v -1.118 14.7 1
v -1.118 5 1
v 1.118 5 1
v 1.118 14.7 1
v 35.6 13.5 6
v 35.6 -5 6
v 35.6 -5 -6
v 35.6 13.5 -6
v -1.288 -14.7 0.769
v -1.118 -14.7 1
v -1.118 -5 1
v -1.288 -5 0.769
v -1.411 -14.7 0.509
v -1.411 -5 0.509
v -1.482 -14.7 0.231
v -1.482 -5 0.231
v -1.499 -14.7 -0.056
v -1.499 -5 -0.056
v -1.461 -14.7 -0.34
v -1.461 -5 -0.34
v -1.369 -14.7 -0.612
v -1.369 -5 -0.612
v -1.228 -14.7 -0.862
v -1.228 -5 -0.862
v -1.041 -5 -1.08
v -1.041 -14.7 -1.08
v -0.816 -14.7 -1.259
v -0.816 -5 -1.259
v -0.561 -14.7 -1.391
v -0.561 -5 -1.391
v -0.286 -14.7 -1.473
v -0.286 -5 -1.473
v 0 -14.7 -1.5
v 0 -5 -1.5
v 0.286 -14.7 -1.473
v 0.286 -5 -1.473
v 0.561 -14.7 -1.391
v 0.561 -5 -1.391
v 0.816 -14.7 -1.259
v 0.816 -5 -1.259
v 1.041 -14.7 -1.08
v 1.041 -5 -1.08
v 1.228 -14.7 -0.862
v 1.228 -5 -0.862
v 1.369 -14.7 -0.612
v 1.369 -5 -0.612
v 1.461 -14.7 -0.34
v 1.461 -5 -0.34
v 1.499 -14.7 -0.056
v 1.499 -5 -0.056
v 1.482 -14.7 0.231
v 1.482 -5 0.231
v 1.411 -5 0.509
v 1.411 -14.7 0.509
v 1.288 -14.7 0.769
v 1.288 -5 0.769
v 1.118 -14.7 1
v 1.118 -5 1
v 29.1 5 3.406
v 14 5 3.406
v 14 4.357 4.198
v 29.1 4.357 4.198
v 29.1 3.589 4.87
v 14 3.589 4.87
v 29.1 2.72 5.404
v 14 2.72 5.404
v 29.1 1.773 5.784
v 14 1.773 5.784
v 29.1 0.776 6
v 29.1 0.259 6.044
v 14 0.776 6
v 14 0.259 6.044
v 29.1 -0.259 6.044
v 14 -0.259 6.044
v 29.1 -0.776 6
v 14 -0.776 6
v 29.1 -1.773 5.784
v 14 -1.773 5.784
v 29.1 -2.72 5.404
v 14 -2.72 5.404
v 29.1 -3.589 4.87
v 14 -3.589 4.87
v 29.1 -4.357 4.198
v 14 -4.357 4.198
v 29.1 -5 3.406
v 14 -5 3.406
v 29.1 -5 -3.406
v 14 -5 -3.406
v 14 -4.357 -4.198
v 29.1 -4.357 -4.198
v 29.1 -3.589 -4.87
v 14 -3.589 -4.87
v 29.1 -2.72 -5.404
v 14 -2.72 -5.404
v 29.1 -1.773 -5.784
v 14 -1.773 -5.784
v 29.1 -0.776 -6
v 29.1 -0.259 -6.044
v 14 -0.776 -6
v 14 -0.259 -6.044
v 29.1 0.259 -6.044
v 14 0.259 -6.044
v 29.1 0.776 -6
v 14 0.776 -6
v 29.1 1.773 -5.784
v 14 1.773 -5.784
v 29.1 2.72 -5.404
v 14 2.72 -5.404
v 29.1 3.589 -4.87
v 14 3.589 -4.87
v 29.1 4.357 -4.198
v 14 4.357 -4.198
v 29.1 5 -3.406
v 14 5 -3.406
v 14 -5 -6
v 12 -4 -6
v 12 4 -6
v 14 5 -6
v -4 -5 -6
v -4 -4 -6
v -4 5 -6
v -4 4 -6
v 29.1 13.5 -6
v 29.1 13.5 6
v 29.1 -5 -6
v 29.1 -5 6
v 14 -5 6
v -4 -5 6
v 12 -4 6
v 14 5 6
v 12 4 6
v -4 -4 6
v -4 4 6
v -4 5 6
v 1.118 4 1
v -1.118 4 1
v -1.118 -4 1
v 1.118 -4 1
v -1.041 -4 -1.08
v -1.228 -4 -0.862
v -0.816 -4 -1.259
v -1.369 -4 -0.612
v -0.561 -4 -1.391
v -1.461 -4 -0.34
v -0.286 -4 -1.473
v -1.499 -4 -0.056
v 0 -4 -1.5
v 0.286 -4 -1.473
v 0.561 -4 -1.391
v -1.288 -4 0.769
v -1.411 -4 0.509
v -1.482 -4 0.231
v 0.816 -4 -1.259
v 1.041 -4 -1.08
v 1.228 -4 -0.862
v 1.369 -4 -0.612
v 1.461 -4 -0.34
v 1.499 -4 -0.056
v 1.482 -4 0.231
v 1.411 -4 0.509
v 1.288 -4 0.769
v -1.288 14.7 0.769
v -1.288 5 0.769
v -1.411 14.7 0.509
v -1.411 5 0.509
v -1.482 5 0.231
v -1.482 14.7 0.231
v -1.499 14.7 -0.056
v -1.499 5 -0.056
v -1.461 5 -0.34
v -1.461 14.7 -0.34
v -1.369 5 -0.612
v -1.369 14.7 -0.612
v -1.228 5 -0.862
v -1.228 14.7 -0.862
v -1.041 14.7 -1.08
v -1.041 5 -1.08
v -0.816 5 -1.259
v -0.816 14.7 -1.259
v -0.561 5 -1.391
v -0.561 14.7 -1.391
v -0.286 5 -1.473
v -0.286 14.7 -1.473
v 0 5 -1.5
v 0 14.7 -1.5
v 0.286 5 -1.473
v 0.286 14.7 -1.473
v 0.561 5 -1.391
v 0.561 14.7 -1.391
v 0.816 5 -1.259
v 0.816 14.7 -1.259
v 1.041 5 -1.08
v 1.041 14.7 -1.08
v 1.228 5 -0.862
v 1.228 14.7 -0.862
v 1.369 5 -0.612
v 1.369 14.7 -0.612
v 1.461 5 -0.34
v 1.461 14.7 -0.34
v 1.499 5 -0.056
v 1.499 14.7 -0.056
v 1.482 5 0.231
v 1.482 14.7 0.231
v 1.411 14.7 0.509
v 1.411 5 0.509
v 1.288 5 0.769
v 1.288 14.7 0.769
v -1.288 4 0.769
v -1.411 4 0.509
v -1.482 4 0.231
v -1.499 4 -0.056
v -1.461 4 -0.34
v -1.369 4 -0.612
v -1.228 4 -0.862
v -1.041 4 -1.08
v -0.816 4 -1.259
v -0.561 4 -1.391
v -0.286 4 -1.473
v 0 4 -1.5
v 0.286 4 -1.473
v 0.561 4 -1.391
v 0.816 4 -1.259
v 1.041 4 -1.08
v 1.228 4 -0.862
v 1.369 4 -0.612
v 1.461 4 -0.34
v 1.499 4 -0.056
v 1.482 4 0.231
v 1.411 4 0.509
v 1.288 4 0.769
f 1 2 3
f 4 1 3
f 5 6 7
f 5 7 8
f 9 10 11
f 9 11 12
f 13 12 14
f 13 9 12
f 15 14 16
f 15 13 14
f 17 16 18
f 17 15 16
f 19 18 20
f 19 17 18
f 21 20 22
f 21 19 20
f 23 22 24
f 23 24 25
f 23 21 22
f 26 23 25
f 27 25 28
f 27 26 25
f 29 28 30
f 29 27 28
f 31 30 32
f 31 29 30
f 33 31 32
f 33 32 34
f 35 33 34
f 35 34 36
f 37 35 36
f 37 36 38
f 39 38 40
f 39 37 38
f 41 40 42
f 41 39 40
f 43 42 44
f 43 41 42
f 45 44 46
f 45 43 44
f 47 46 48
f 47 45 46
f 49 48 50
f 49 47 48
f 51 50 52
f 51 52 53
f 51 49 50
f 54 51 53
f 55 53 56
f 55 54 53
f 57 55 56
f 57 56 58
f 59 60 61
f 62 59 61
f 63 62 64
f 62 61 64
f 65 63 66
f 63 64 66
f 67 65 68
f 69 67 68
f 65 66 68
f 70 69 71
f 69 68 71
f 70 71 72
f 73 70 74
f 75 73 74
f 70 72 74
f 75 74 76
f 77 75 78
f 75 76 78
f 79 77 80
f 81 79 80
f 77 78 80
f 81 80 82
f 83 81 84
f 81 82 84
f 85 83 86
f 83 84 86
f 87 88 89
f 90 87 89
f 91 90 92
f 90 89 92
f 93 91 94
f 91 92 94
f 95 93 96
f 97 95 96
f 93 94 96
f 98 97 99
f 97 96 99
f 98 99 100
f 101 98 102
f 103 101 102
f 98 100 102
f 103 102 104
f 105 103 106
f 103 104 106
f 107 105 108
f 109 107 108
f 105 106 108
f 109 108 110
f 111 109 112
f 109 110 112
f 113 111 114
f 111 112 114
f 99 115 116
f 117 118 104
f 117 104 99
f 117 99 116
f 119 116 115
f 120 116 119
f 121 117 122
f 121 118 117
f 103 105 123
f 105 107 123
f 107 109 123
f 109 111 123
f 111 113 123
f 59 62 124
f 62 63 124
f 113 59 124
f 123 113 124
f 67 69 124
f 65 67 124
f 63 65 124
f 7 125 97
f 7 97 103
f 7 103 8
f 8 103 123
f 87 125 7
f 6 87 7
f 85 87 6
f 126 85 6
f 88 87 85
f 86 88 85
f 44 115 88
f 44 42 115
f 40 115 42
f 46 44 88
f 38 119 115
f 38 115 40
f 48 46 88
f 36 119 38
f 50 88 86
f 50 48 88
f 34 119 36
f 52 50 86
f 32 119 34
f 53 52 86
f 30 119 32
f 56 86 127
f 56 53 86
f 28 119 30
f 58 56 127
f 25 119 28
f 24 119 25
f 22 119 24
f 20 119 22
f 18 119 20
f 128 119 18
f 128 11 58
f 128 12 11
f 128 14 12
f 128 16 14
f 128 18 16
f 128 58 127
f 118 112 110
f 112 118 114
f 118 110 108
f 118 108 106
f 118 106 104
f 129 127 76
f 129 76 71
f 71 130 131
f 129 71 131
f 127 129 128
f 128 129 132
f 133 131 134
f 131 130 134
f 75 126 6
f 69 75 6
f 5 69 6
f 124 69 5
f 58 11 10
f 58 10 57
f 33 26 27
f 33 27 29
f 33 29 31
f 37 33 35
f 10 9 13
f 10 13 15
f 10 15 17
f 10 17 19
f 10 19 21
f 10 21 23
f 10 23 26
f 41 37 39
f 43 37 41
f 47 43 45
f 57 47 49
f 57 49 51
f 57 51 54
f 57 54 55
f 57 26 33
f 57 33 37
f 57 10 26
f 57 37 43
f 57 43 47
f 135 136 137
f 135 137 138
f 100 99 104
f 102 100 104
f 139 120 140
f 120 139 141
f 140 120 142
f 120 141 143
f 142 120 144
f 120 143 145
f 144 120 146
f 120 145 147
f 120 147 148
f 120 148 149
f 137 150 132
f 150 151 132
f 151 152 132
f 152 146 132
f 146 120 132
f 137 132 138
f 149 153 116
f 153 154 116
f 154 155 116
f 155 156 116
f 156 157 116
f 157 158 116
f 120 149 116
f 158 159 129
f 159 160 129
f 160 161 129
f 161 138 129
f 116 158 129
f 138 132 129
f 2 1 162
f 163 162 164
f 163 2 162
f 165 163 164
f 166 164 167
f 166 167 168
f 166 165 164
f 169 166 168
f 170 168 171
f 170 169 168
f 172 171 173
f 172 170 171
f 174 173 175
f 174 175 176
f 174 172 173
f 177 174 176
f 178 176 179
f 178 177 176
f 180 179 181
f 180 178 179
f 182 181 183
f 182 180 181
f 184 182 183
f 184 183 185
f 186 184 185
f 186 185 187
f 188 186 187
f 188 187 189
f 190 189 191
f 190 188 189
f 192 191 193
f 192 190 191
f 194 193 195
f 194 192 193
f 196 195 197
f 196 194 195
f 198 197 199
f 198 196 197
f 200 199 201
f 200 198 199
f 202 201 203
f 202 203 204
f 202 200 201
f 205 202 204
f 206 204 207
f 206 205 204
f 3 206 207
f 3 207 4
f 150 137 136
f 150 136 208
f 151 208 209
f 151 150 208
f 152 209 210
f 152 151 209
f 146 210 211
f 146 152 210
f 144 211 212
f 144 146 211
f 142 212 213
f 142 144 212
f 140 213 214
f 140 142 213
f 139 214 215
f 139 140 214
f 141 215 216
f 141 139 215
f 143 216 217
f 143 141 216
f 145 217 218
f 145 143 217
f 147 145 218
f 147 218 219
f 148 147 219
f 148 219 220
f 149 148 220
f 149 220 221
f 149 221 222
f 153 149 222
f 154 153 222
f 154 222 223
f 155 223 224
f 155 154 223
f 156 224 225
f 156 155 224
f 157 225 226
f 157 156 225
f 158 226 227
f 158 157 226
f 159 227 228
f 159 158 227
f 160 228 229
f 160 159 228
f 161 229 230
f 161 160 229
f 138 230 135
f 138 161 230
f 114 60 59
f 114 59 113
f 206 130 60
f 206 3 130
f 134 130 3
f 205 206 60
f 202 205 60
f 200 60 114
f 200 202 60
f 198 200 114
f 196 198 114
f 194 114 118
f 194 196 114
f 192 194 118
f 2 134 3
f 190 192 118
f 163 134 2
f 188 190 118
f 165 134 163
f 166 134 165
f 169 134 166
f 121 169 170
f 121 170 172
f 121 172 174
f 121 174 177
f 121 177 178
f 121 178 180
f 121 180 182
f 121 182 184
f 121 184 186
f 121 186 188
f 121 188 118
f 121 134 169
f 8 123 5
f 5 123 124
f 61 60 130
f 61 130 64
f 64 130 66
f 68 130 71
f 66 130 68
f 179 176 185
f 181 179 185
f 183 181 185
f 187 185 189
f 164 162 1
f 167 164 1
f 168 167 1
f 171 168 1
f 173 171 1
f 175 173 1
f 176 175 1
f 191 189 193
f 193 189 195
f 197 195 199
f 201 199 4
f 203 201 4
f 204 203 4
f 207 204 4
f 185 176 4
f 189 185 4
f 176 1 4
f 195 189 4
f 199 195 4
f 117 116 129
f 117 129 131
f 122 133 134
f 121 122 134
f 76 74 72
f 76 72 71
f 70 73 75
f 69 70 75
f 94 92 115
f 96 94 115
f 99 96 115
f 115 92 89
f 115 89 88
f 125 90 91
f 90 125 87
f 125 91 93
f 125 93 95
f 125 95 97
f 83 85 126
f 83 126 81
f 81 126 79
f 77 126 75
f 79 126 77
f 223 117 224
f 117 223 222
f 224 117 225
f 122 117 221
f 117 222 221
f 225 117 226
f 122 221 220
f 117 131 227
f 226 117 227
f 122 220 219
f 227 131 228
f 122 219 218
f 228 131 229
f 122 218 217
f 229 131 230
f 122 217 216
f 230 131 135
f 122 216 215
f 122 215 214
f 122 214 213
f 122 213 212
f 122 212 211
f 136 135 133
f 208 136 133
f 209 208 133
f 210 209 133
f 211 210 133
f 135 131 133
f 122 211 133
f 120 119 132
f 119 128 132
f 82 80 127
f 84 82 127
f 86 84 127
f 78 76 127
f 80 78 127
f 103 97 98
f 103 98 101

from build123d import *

# Parameters (mm, degrees)
PAD_DEPTH    = 6
PAD001_DEPTH = 14.7
PAD002_DEPTH = 15.1
SKETCH003_W  = 18.5
SKETCH003_H  = 12
PAD003_DEPTH = 6.5


with BuildPart() as part:
    # Sketch → Pad (new body, symmetric)
    with BuildSketch(Plane.XY):
        Polygon((-4, 5), (14, 5), (14, -5), (-4, -5), (-4, -4), (12, -4), (12, 4), (-4, 4), align=None)
    extrude(amount=PAD_DEPTH, both=True)

    # Sketch001 → Pad001 (join, symmetric)
    with BuildSketch(Plane.XZ):
        with BuildLine():
            ThreePointArc((-1.118034, 1), (0, -1.5), (1.118034, 1))
            Line((-1.118034, 1), (1.118034, 1))
        make_face()
    extrude(amount=PAD001_DEPTH, both=True)

    # Sketch002 (on DatumPlane) → Pad002 (join)
    with BuildSketch(Plane.YZ.offset(14)):
        with BuildLine():
            ThreePointArc((5, 3.406244), (0, 6.05), (-5, 3.406244))
            Line((-5, -3.406244), (-5, 3.406244))
            ThreePointArc((-5, -3.406244), (0, -6.05), (5, -3.406244))
            Line((5, 3.406244), (5, -3.406244))
        make_face()
    extrude(amount=PAD002_DEPTH)

    # Sketch003 (on DatumPlane) → Pad003 (join)
    with BuildSketch(Plane.YZ.offset(29.1)):
        with Locations((4.25, 0)):
            Rectangle(SKETCH003_W, SKETCH003_H)
    extrude(amount=PAD003_DEPTH)


solid = part.part
